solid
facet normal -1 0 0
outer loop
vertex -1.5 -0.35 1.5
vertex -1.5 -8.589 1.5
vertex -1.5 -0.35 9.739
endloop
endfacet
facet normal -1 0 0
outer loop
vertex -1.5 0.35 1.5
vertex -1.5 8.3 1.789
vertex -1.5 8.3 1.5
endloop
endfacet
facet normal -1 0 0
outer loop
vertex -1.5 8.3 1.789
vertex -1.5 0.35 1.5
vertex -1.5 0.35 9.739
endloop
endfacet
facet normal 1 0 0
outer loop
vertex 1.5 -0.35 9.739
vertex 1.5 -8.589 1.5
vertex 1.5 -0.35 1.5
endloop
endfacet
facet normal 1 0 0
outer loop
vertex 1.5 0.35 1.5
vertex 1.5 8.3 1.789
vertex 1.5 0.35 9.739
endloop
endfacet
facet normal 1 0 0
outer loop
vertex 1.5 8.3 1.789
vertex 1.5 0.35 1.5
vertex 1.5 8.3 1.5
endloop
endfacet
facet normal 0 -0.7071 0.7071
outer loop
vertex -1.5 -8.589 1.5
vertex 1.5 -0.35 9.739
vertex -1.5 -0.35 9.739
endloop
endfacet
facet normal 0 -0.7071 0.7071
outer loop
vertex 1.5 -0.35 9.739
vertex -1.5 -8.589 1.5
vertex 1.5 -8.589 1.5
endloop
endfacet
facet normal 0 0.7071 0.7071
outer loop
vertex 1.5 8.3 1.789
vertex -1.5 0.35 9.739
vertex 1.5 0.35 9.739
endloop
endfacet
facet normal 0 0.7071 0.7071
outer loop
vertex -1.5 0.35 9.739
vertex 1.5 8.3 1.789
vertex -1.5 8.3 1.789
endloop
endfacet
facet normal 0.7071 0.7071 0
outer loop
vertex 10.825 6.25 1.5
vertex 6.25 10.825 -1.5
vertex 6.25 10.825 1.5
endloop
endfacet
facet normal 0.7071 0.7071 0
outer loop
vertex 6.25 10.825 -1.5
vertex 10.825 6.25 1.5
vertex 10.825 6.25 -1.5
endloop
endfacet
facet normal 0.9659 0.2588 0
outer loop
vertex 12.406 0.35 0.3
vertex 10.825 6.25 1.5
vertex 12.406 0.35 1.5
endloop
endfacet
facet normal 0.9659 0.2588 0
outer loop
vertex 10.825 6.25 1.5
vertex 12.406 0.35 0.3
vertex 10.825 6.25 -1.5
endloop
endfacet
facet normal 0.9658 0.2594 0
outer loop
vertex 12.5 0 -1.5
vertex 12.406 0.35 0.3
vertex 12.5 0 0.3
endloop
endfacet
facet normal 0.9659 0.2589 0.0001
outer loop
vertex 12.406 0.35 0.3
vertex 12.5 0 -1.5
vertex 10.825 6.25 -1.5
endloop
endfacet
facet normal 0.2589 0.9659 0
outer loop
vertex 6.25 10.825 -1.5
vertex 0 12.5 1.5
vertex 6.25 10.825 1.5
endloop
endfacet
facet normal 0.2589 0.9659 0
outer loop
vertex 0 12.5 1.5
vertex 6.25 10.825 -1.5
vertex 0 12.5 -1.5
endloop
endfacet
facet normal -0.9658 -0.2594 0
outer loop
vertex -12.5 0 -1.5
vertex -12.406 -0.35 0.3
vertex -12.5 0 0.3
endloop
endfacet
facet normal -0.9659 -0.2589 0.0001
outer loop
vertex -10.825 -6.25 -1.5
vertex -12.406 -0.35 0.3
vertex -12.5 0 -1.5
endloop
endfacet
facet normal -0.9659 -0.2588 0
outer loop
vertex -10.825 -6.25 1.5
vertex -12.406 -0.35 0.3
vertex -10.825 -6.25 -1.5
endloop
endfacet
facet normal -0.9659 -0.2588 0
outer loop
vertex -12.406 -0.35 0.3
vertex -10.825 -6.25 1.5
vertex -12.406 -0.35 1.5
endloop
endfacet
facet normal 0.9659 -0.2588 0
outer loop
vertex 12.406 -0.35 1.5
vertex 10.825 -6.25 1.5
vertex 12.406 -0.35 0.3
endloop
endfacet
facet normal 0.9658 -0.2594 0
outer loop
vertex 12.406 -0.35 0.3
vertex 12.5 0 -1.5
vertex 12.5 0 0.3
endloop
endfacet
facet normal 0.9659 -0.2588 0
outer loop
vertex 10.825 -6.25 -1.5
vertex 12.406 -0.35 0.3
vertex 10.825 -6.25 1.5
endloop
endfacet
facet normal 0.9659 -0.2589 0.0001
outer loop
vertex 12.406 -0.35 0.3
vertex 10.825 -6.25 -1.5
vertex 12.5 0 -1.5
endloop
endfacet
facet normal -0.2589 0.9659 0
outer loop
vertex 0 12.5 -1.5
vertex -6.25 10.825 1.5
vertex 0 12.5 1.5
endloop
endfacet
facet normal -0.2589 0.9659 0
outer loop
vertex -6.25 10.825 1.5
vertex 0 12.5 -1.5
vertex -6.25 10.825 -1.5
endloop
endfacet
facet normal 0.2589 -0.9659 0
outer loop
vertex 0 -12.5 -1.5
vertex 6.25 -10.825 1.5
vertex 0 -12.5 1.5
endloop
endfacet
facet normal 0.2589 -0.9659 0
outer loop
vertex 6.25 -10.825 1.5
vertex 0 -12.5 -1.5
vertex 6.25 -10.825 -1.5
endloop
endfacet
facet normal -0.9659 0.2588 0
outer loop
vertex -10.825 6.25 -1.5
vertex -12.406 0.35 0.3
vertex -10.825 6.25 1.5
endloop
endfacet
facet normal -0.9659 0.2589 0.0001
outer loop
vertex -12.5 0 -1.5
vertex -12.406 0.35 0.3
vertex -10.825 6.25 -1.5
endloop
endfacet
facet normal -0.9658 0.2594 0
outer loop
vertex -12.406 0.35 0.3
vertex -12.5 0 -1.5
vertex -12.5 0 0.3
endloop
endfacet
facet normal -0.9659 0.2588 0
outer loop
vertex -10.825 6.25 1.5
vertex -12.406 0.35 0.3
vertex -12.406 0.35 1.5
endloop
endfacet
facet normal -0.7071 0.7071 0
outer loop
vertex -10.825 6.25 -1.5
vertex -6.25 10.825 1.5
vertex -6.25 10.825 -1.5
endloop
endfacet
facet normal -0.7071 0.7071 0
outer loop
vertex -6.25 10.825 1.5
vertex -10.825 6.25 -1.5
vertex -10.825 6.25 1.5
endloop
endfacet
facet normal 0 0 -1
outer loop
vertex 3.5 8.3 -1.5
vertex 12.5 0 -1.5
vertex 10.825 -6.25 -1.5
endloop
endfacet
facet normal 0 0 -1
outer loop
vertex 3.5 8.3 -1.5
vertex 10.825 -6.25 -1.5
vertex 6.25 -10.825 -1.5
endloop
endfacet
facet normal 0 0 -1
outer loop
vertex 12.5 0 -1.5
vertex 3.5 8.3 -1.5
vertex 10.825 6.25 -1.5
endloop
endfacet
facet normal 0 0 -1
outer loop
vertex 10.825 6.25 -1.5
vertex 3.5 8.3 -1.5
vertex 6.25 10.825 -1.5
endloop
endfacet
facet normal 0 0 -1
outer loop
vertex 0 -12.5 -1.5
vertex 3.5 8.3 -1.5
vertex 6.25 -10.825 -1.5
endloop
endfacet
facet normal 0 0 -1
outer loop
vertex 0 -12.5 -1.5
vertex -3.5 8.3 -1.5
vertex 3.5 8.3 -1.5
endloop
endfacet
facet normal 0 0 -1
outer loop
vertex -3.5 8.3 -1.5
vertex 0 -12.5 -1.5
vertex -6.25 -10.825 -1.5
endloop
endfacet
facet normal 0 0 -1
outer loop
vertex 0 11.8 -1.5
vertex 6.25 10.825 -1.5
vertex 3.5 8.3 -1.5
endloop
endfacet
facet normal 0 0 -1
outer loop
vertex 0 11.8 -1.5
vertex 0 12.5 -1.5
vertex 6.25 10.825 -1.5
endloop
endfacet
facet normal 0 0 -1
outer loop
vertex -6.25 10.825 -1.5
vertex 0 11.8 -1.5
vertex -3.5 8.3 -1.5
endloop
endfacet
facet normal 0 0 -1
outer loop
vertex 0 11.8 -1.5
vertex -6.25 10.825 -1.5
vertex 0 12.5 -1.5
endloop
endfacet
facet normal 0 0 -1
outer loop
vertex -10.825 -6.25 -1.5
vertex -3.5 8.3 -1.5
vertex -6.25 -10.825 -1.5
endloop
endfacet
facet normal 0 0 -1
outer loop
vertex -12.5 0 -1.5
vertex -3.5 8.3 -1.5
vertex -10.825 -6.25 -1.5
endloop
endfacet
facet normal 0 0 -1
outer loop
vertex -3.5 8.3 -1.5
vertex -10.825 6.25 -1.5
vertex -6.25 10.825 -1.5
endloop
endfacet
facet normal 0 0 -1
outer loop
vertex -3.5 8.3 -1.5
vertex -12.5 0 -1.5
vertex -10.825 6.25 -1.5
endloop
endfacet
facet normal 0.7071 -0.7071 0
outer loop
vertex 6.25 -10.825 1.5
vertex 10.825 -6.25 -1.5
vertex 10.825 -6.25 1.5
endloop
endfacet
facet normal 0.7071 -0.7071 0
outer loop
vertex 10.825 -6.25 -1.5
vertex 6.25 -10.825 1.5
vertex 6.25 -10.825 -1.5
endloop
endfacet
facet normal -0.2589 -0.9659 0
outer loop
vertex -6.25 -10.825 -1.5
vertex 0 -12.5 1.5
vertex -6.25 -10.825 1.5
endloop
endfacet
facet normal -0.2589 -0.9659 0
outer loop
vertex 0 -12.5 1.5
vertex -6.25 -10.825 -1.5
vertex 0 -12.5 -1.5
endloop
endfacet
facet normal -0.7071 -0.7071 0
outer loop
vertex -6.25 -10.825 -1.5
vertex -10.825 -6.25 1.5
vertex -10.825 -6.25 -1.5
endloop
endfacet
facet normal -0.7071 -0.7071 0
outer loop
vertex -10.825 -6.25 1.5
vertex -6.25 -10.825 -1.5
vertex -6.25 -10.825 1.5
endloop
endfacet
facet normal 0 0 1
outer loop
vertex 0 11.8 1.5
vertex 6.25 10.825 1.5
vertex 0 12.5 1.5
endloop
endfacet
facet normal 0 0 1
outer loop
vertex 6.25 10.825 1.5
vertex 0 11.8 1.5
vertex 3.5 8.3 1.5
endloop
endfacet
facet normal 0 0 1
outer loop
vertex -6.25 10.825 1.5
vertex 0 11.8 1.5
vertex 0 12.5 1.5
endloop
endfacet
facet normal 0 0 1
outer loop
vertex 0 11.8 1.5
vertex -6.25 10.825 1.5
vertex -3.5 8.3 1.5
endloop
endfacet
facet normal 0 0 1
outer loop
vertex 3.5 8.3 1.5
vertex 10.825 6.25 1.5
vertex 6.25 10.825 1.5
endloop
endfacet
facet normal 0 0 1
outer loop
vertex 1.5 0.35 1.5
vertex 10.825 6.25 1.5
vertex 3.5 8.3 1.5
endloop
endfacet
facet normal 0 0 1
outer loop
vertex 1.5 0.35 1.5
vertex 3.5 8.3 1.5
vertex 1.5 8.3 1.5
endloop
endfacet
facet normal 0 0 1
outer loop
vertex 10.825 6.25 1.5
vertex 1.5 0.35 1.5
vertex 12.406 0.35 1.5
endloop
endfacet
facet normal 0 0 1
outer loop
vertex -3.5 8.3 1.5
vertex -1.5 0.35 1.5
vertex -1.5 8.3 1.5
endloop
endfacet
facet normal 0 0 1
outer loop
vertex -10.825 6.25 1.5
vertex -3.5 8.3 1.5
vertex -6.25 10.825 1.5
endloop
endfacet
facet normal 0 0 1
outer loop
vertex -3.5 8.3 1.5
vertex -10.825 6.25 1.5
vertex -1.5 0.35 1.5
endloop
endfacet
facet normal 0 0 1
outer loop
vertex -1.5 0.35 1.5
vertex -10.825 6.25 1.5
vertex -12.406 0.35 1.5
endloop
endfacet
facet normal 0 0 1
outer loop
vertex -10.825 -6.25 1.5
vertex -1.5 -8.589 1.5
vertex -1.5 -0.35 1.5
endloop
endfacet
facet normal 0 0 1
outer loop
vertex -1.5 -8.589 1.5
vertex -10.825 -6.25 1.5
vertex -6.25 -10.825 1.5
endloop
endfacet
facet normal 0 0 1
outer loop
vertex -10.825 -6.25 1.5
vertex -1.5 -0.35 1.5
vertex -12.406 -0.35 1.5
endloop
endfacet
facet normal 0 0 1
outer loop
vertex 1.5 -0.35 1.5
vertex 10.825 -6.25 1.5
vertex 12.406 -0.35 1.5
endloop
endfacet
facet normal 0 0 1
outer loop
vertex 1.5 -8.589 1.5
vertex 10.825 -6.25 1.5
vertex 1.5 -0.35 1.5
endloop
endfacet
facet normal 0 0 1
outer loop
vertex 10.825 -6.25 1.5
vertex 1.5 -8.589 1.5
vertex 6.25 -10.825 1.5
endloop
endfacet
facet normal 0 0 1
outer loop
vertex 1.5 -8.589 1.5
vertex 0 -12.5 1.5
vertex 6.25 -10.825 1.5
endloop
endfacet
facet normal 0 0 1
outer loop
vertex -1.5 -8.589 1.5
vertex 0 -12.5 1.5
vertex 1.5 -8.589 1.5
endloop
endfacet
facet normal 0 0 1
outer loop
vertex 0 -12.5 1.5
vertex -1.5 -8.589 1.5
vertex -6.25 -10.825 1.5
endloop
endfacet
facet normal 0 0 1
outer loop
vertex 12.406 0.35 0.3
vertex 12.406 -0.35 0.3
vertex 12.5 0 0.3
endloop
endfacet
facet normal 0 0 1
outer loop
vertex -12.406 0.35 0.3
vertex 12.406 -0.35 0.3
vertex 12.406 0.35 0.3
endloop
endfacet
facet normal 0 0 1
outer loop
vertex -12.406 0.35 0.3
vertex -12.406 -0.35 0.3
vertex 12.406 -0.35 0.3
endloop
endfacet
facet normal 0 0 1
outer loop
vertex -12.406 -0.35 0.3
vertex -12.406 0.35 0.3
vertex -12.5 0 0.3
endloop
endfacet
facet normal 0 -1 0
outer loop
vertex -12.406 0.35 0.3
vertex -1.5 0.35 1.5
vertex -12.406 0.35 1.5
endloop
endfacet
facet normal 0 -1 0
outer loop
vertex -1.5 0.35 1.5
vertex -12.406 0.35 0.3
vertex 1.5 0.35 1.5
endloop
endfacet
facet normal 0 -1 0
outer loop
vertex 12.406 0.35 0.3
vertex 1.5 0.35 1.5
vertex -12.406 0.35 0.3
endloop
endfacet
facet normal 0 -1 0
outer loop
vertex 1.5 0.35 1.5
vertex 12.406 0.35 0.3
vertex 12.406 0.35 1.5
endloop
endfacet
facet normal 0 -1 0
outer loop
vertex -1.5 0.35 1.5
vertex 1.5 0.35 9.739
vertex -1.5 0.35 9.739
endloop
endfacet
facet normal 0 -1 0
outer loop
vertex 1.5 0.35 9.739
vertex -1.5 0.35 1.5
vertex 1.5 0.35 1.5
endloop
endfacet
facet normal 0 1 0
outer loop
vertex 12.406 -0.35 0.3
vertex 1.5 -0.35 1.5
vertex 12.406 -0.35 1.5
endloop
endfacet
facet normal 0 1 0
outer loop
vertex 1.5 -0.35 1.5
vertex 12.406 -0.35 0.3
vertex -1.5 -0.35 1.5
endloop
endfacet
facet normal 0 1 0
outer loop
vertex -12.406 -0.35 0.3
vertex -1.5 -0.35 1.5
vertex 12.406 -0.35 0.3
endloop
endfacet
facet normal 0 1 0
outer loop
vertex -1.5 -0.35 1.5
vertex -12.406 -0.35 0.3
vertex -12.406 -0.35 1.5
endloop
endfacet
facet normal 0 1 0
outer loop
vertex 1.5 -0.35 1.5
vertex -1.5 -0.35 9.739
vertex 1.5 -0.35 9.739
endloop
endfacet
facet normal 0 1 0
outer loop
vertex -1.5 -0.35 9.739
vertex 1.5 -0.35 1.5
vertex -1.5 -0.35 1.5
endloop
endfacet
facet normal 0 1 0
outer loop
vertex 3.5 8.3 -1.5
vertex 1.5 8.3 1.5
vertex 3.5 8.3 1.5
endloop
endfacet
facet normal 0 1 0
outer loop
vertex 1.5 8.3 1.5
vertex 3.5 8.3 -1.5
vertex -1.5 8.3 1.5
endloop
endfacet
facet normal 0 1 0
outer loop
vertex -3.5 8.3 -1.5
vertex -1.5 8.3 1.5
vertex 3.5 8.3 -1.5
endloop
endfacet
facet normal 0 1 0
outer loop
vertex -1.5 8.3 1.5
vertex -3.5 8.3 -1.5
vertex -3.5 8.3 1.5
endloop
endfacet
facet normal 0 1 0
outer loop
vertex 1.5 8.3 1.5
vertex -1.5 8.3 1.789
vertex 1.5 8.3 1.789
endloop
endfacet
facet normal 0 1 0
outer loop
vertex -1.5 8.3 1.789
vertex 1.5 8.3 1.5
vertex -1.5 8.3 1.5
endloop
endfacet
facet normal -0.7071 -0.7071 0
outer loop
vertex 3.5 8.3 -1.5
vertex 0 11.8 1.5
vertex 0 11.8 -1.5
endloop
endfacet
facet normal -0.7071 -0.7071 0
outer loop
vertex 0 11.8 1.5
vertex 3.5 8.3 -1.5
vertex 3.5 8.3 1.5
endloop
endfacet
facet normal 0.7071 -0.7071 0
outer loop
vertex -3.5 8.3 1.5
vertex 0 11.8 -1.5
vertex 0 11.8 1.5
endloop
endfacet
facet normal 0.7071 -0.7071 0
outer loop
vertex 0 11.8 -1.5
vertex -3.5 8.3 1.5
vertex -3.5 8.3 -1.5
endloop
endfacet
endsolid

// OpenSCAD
$fn=12;

// unit is mm

diameter = 25;
thickness = 3;
slit_width = 0.7;
arrow_base = 7;
support_height = 10;

ab_2 = arrow_base / 2;
thickness12 = 1.2 * thickness;
diameter_2 = diameter / 2;


difference() {

  union() {

    // base

    cylinder(d=diameter, h=thickness, center=true);

    // support

    difference() {
      translate([ 0, 0, -0.7 * diameter_2 + support_height  ])
        rotate([ 45, 0, 0 ])
          cube([ thickness, diameter_2, diameter_2 ], center=true);
      translate([ 0, 0, -diameter_2 ])
        cube([ diameter, diameter, diameter ], center=true);
    }
  }

  union() {

    // slit

    translate([ 0, 0, diameter_2 + 0.1 * thickness ])
      cube([ diameter, slit_width, diameter ], center=true);

    // arrow

    translate([ 0, diameter_2 - 1.2 * ab_2, -0.5 * thickness12 ])
      linear_extrude(thickness12)
        polygon([
          [ -ab_2, 0 ], [ 0, ab_2 ], [ ab_2, 0 ] ]);
  }
}
